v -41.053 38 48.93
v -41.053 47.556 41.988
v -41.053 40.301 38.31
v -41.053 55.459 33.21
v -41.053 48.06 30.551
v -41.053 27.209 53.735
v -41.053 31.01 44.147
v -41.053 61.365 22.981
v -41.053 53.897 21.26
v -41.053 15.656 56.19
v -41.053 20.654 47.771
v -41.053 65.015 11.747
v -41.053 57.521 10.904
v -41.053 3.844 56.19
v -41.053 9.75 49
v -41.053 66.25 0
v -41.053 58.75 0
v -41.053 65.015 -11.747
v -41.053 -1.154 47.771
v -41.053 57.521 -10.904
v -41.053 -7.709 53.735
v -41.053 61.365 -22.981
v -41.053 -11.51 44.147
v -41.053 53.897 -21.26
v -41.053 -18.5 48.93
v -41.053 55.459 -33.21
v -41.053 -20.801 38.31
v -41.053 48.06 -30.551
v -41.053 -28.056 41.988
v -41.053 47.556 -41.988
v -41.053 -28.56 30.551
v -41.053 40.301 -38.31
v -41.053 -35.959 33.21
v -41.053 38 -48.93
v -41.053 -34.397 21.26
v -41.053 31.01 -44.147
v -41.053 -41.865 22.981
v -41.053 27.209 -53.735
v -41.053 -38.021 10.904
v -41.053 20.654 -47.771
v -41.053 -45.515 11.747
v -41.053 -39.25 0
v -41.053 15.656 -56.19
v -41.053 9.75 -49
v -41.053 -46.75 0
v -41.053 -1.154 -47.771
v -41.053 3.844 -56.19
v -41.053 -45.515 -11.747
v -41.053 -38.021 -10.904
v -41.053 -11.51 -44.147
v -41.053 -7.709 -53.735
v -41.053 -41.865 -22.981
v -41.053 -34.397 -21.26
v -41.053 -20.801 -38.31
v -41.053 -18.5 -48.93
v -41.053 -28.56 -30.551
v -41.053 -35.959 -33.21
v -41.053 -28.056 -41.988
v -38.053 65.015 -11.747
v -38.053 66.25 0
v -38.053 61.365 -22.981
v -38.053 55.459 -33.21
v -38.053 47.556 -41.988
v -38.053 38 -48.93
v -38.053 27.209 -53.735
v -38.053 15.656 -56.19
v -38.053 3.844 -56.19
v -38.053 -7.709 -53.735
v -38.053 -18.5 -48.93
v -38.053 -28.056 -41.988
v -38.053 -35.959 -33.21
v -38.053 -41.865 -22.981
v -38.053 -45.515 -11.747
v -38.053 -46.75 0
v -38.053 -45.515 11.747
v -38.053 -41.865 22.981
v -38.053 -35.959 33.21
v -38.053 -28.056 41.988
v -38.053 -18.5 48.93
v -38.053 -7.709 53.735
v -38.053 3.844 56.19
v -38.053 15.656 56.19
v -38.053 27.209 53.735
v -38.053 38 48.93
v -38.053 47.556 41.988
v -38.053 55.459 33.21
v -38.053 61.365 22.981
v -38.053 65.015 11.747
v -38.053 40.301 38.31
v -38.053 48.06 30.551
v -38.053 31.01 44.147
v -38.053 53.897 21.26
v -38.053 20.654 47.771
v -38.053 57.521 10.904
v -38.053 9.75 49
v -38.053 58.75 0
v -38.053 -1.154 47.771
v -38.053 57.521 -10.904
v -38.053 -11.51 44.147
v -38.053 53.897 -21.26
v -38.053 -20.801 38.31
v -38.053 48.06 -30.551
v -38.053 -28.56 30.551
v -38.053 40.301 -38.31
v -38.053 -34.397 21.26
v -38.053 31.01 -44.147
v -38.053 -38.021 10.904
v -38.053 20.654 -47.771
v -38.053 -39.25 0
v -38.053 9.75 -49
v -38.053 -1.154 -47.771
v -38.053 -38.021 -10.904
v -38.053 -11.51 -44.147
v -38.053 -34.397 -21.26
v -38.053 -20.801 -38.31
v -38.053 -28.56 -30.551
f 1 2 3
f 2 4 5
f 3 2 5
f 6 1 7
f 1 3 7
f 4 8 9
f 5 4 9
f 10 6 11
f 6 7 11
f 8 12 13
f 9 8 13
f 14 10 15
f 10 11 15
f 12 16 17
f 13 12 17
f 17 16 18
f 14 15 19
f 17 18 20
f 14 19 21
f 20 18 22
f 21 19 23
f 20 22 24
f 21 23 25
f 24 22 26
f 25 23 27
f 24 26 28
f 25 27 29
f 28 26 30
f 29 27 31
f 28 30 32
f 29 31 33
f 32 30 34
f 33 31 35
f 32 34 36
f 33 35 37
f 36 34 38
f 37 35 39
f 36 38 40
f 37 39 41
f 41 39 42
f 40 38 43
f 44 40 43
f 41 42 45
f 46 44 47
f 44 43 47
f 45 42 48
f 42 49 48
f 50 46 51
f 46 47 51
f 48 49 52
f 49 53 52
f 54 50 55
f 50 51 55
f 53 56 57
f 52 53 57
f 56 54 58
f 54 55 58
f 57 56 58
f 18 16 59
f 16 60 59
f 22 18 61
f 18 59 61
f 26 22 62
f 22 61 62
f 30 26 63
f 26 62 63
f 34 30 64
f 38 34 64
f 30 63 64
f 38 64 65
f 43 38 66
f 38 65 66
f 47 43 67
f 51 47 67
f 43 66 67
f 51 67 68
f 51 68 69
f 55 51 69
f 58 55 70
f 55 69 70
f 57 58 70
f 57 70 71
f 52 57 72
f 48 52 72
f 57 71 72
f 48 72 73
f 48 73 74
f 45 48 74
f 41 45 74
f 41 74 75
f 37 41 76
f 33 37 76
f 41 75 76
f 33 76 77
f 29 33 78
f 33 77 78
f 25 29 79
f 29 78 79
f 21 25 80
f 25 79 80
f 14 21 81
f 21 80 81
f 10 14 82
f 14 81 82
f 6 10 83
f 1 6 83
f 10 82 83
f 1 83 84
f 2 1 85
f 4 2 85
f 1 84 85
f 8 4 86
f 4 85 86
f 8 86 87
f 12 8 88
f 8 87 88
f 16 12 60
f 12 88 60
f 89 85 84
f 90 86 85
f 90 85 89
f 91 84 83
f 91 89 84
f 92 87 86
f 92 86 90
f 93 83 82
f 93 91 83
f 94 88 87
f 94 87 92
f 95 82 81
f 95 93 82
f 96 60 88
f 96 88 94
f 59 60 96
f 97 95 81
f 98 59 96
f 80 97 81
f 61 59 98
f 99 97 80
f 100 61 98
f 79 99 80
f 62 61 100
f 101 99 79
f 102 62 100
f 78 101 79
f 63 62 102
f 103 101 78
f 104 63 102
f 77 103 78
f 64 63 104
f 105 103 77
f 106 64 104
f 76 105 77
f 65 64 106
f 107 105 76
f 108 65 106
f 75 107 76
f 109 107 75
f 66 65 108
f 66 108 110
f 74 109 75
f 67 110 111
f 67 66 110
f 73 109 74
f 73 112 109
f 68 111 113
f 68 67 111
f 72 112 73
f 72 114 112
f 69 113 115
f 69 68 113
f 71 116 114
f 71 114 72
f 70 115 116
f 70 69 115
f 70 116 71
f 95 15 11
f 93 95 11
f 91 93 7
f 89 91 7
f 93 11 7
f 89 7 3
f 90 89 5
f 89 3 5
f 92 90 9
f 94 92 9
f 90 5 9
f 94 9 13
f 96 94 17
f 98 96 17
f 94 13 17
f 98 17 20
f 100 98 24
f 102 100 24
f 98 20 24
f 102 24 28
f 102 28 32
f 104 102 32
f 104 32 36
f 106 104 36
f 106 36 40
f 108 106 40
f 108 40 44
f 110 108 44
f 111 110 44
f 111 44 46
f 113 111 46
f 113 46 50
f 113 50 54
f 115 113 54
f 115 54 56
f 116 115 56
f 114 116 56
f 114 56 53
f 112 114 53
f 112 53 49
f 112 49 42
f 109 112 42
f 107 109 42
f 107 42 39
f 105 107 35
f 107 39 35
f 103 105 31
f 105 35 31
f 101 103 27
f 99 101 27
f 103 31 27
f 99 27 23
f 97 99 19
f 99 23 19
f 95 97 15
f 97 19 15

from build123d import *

# Parameters (mm, degrees)
SKIZZE1_W                        = 3
SKIZZE1_H                        = 52.95
F_4_7_4_7_DURCHMESSER_BOHRUNG1_D = 4.7
SKIZZE5_RX                       = 25
SKIZZE5_RY                       = 10
SCHNITT_LINEAR_AUSTRAGEN1_DEPTH  = 3
KREISMUSTER1_COUNT               = 4
CUT_EXTRUDE1_REACH               = 5
SKETCH1_R                        = 49


with BuildPart() as part:
    # Skizze1 → Rotation1 (revolve)
    with BuildSketch(Plane.XY):
        with Locations((-39.553372853, 39.775)):
            Rectangle(SKIZZE1_W, SKIZZE1_H)
    revolve(axis=Axis((-17.6629112, 9.75, 0), (-1, 0, 0)))

    # Ø4.7 (4.7) Durchmesser Bohrung1 (through all)
    with Locations(Plane(origin=(-41.053372853, 11.968723204, 19.868936148), x_dir=(0, 0, 1), z_dir=(-1, 0, 0))):
        with Locations((-13.504975118, -8.582684234), (-26.232897179, -8.582684234), (-26.232897179, 4.145237827), (-13.504975118, 4.145237827)):
            Hole(F_4_7_4_7_DURCHMESSER_BOHRUNG1_D / 2)

    # Skizze5 → Schnitt-Linear austragen1 (cut)
    with BuildSketch(Plane(origin=(-38.053372853, 0, 0), x_dir=(0, 0, -1), z_dir=(1, 0, 0))):
        with Locations(Location((-23.027329597, 32.684515508), (0, 0, 45.090609512))):
            Ellipse(SKIZZE5_RX, SKIZZE5_RY)
    schnitt_linear_austragen1 = extrude(amount=-SCHNITT_LINEAR_AUSTRAGEN1_DEPTH, mode=Mode.SUBTRACT)

    # Kreismuster1: Schnitt-Linear austragen1 ×4 about axis
    kreismuster1_axis = Axis((0, 9.75, 0), (-1, 0, 0))
    for i in range(1, KREISMUSTER1_COUNT):
        add(schnitt_linear_austragen1.rotate(kreismuster1_axis, i * 360 / KREISMUSTER1_COUNT), mode=Mode.SUBTRACT)

    # Sketch1 → Cut-Extrude1 (cut, up to next)
    with BuildSketch(Plane.ZY.offset(41.053372853), mode=Mode.PRIVATE) as cut_extrude1_sk1:
        with Locations((0, 9.75)):
            Circle(SKETCH1_R)
    cut_extrude1_tool1 = extrude(cut_extrude1_sk1.sketch, amount=-CUT_EXTRUDE1_REACH, mode=Mode.PRIVATE) & part.part
    add(cut_extrude1_tool1.solids().sort_by_distance((-41.053373, 9.75, 0))[0], mode=Mode.SUBTRACT)


solid = part.part
